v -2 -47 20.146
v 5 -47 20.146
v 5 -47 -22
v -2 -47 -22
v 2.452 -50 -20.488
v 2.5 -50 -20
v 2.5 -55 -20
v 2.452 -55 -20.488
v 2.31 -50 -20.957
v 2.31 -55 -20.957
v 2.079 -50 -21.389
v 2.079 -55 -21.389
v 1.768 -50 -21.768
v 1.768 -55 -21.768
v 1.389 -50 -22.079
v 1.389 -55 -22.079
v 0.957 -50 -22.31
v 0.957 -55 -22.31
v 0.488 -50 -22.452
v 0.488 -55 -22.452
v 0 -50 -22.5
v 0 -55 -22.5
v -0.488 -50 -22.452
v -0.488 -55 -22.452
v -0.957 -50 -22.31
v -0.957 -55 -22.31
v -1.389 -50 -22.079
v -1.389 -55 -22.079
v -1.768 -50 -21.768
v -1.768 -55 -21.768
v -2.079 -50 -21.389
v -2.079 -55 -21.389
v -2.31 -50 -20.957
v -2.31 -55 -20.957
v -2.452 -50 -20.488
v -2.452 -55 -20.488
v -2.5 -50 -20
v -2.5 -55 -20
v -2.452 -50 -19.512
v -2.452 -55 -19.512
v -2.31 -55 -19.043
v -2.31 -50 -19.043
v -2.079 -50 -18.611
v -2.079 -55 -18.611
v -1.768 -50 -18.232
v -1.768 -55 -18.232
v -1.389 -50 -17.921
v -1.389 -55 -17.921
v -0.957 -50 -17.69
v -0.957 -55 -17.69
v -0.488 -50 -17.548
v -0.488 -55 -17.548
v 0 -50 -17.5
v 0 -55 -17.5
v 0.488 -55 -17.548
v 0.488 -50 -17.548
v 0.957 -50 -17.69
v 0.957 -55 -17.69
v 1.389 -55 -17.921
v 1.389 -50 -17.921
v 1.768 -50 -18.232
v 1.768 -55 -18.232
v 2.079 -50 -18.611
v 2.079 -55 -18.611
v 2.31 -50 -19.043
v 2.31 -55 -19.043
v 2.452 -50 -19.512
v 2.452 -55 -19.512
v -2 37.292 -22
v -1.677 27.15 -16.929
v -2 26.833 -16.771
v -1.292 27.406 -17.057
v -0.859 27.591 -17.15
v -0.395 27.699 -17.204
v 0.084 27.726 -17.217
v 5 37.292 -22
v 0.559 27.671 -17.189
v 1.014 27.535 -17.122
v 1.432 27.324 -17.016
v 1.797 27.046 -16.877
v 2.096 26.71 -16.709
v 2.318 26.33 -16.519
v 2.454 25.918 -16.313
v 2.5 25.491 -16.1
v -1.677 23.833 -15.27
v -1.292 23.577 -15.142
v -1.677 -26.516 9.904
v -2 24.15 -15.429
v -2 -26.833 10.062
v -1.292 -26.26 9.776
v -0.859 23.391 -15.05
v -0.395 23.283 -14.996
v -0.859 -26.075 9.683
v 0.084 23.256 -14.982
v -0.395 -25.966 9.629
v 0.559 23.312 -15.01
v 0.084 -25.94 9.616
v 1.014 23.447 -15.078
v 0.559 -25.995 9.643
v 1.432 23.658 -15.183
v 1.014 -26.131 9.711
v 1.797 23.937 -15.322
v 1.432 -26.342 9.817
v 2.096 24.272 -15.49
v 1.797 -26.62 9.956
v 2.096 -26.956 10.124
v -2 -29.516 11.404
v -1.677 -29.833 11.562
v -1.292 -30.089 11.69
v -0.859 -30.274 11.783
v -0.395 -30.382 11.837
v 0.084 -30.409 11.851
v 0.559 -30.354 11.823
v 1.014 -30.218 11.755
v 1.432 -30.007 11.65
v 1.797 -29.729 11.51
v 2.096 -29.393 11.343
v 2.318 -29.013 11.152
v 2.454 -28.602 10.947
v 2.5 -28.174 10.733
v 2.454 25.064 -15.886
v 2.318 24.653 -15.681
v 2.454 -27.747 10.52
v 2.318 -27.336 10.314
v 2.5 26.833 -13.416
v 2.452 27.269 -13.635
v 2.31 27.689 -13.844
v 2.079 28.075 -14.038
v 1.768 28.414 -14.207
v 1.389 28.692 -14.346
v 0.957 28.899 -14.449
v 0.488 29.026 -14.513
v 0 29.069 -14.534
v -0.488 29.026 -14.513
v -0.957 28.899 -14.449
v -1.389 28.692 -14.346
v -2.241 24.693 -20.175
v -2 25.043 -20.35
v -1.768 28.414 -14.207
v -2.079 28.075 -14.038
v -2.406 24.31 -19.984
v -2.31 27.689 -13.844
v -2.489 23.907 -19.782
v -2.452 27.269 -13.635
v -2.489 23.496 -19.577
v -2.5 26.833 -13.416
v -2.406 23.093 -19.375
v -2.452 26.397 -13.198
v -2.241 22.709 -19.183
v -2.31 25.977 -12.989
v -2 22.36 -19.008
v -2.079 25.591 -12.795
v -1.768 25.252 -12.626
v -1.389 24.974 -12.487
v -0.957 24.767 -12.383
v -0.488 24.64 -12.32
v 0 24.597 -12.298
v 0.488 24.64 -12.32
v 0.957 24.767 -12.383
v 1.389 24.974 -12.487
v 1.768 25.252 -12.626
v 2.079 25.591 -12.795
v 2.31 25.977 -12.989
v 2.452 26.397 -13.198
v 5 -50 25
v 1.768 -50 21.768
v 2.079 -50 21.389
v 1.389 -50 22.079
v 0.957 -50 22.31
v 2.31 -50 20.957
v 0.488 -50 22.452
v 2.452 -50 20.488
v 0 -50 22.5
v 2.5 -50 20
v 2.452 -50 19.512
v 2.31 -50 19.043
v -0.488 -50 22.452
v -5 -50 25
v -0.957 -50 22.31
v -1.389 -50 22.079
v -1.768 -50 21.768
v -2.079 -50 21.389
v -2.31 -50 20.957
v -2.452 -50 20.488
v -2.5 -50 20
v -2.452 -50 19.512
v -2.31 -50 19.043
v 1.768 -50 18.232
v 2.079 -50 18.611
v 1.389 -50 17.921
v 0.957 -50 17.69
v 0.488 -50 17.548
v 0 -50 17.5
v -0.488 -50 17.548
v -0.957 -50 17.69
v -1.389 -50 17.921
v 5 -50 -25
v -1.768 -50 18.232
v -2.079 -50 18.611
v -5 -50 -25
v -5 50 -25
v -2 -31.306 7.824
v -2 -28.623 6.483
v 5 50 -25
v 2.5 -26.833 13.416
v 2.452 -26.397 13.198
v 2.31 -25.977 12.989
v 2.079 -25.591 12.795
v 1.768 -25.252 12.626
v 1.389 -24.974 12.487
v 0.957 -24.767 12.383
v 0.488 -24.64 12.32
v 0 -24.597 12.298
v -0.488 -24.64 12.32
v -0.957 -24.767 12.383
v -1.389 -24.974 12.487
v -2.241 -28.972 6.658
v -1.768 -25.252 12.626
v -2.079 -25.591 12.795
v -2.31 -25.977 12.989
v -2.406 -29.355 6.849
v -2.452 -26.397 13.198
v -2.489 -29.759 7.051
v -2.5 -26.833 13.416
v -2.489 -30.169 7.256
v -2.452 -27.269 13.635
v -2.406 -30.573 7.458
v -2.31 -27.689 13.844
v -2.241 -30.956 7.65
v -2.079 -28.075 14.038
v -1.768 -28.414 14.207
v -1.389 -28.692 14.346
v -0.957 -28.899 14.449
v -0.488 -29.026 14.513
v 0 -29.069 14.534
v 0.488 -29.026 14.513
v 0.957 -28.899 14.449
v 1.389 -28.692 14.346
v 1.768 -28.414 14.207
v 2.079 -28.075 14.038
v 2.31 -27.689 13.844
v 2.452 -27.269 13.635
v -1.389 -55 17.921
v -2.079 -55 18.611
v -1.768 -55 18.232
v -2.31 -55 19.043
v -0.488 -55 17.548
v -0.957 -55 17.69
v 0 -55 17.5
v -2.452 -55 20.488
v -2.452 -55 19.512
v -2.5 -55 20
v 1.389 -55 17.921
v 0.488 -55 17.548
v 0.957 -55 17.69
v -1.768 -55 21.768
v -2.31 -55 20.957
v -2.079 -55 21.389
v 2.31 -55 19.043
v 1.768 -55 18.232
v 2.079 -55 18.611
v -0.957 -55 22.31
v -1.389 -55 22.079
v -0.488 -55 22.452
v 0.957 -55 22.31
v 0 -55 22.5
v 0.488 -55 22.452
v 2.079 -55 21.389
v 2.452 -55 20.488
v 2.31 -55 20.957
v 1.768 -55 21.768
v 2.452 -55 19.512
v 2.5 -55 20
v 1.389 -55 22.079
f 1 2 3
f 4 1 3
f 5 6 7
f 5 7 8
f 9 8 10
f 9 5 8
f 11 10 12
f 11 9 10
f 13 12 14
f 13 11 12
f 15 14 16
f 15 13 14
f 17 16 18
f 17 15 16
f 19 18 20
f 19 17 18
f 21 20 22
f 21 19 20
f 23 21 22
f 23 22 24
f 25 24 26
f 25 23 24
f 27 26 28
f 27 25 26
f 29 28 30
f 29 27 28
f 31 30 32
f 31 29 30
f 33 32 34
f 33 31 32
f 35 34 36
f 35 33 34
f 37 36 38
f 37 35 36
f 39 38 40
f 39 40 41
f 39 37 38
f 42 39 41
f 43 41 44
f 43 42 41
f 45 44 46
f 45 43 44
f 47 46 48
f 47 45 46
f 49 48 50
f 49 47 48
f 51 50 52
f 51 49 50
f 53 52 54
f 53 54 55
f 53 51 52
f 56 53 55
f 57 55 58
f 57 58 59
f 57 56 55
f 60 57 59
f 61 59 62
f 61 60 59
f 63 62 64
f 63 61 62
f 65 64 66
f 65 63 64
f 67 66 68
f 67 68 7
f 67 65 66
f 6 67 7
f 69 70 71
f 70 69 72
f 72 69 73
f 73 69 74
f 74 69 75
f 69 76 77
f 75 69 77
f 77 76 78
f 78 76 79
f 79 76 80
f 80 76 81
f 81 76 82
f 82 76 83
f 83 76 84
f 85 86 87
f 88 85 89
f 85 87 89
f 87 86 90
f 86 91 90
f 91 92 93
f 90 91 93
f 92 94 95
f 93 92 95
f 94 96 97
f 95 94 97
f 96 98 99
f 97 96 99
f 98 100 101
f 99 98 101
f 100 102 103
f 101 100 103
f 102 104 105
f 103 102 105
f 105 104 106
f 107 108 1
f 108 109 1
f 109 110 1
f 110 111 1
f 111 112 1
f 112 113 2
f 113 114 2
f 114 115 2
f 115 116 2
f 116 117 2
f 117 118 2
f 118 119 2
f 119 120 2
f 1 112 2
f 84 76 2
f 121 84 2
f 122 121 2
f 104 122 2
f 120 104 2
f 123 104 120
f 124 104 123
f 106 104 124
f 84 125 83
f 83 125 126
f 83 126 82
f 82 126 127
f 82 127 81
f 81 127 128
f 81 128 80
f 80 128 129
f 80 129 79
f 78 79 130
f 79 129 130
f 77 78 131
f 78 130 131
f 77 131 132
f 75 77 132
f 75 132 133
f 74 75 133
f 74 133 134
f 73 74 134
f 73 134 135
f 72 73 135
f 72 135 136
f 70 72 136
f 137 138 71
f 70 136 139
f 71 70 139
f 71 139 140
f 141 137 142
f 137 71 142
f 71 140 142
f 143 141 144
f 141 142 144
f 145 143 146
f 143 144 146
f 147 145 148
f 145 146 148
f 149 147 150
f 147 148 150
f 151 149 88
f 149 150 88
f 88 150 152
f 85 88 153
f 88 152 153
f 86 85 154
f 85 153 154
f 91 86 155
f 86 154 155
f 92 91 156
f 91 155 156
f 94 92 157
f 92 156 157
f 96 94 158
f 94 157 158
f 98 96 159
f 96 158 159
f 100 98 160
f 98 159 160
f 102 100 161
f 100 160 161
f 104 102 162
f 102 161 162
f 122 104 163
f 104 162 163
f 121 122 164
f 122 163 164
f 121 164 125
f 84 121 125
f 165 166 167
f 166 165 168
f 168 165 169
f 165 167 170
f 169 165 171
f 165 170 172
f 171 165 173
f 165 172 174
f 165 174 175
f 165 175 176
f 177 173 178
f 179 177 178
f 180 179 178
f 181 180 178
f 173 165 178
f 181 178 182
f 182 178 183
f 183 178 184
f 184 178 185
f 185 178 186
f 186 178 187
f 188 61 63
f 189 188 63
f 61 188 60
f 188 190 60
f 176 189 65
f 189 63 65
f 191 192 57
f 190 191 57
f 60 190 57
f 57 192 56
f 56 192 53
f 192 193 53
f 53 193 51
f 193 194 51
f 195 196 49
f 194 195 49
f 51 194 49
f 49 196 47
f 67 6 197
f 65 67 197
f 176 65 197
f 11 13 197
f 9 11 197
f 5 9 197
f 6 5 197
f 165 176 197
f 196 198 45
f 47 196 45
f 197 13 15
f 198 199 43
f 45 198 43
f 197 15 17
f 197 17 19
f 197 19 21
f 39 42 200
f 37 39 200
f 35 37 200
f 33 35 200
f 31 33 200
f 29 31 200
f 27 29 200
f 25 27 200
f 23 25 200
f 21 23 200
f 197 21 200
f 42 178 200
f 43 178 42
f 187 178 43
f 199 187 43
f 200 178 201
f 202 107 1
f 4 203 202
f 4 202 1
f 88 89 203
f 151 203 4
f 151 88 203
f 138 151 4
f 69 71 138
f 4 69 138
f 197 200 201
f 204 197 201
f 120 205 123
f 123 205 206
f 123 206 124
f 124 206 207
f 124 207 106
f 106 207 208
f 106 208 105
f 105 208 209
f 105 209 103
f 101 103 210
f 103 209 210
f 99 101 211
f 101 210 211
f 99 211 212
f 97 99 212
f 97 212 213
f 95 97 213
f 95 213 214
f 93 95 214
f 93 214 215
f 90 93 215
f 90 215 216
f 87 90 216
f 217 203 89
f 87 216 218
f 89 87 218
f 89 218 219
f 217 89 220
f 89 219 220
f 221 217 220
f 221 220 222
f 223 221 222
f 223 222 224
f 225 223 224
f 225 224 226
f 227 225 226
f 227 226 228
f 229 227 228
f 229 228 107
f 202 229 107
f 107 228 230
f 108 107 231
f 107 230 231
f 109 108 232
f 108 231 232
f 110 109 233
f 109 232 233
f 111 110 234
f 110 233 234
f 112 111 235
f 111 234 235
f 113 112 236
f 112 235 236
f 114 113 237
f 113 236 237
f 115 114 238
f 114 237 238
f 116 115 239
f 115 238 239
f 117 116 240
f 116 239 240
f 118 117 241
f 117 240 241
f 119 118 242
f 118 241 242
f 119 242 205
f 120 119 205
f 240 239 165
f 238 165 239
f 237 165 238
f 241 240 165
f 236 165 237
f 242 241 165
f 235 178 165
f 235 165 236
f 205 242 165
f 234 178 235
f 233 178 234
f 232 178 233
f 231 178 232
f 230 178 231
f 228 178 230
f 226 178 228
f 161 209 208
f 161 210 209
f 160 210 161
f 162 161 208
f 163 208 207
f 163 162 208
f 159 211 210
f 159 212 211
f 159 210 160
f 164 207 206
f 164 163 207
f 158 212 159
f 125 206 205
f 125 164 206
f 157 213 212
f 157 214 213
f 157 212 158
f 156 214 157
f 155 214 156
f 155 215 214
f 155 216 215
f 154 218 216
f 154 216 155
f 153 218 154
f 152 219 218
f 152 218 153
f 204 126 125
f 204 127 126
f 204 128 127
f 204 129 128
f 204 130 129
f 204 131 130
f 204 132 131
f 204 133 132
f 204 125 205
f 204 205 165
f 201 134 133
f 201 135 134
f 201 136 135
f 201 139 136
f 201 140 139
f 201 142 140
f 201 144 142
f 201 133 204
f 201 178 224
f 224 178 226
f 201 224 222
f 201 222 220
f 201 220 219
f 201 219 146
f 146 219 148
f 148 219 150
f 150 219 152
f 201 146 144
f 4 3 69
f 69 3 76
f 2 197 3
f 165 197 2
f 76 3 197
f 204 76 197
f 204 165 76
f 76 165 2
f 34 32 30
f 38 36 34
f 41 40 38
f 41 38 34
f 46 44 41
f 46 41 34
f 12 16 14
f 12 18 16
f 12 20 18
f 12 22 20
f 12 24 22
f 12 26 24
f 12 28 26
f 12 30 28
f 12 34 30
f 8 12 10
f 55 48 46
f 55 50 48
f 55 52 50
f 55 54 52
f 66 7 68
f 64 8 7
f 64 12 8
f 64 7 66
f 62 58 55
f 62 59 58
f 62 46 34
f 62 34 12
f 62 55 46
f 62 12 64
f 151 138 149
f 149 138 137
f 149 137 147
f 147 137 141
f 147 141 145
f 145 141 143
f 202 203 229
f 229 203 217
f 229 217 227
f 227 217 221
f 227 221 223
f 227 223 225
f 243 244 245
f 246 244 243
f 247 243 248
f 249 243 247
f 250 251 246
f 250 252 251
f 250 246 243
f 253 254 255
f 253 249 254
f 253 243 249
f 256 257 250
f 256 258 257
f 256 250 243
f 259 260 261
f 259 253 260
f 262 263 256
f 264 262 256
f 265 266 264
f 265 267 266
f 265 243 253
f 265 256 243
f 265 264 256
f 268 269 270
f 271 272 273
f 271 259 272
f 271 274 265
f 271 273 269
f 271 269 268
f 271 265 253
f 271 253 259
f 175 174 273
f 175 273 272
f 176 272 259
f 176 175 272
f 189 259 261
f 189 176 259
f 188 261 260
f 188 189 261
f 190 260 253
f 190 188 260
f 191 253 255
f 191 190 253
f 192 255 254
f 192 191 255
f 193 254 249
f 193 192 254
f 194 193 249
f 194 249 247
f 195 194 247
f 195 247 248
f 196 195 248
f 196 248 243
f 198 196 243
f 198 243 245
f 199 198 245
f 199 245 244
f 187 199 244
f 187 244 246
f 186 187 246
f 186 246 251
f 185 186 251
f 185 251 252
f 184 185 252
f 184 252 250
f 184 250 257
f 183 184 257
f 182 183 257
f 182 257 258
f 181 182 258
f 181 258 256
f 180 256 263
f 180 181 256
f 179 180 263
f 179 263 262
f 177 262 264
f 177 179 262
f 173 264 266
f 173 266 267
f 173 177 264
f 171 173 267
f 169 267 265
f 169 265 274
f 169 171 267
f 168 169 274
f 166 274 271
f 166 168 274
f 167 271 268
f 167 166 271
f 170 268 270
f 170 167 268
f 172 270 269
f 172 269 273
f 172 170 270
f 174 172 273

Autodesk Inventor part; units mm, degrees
sketch "Sketch2" plane through (0, 0, 0) normal (1, 0, 0) x (0, 1, 0)
  line L0 (50, 25) -> (-50, 25)
  line L1 (-50, 25) -> (-50, -25)
  line L2 (-50, -25) -> (50, -25)
  line L3 (50, -25) -> (50, 25)
  line L4 (-70, 0) -> (70, 0) projected
  line L5 (0, 35) -> (0, -35) projected
  line L6 (-50, 25) -> (50, -25)
  point P0 (0, 0)
  point P1 (50, 0)
  point P2 (0, 25)
  dimension "d0" = 50
  dimension "d1" = 100
extrude "Extrusion1" add sketch "Sketch2" along normal mid plane 10 contours L6 L4 L1 | L5 L2 L1 L4 | L6 L2 L5
sketch "Sketch4" plane through (5, 0, 0) normal (1, 0, 0) x (0, 0, -1)
  line L0 (25, 50) -> (-25, -50) projected
  line L1 (25, -50) -> (25, 50) projected
  line L2 (-25, -50) -> (25, -50) projected
  line L3 (22, 37.2918) -> (-20.1459, -47)
  line L4 (-20.1459, -47) -> (22, -47)
  line L5 (22, -47) -> (22, 37.2918)
  point P0 (0, 0)
  dimension "d8" = 3
extrude "Extrusion2" cut sketch "Sketch4" against normal blind 7 contours L5 L4 L3
sketch "Sketch5" plane through (-5, -50, -25) normal (0, -1, 0) x (1, 0, 0)
  line L0 (5, 60) -> (5, -10) projected
  circle A0 centre (5, 45) radius 2.5
  line L1 (10, 50) -> (0, 50) projected
  circle A1 centre (5, 5) radius 2.5
  point P0 (5, 25)
  dimension "d11" = 5
  dimension "d12" = 5
  dimension "d15" = 40
extrude "Extrusion3" add sketch "Sketch5" along normal blind 5
sketch "Sketch8" plane through (-5, -50, 25) normal (0, 0.4472, 0.8944) x (1, 0, 0)
  line L0 (10, 0) -> (0, 0) projected
  line L1 (0, 111.8034) -> (10, 111.8034) projected
  circle A0 centre (5, 85.9017) radius 2.5
  line L2 (5, 134.1641) -> (5, -22.3607) projected
  line L3 (-2, 55.9017) -> (12, 55.9017) projected
  circle A1 centre (5, 25.9017) radius 2.5
  point P0 (5, 55.9017)
  dimension "d31" = 111.8034
  dimension "d32" = 5
  dimension "d34" = 30
extrude "Extrusion4" cut sketch "Sketch8" against normal blind 7
properties part number "Roof_Wall_Large_Left"
